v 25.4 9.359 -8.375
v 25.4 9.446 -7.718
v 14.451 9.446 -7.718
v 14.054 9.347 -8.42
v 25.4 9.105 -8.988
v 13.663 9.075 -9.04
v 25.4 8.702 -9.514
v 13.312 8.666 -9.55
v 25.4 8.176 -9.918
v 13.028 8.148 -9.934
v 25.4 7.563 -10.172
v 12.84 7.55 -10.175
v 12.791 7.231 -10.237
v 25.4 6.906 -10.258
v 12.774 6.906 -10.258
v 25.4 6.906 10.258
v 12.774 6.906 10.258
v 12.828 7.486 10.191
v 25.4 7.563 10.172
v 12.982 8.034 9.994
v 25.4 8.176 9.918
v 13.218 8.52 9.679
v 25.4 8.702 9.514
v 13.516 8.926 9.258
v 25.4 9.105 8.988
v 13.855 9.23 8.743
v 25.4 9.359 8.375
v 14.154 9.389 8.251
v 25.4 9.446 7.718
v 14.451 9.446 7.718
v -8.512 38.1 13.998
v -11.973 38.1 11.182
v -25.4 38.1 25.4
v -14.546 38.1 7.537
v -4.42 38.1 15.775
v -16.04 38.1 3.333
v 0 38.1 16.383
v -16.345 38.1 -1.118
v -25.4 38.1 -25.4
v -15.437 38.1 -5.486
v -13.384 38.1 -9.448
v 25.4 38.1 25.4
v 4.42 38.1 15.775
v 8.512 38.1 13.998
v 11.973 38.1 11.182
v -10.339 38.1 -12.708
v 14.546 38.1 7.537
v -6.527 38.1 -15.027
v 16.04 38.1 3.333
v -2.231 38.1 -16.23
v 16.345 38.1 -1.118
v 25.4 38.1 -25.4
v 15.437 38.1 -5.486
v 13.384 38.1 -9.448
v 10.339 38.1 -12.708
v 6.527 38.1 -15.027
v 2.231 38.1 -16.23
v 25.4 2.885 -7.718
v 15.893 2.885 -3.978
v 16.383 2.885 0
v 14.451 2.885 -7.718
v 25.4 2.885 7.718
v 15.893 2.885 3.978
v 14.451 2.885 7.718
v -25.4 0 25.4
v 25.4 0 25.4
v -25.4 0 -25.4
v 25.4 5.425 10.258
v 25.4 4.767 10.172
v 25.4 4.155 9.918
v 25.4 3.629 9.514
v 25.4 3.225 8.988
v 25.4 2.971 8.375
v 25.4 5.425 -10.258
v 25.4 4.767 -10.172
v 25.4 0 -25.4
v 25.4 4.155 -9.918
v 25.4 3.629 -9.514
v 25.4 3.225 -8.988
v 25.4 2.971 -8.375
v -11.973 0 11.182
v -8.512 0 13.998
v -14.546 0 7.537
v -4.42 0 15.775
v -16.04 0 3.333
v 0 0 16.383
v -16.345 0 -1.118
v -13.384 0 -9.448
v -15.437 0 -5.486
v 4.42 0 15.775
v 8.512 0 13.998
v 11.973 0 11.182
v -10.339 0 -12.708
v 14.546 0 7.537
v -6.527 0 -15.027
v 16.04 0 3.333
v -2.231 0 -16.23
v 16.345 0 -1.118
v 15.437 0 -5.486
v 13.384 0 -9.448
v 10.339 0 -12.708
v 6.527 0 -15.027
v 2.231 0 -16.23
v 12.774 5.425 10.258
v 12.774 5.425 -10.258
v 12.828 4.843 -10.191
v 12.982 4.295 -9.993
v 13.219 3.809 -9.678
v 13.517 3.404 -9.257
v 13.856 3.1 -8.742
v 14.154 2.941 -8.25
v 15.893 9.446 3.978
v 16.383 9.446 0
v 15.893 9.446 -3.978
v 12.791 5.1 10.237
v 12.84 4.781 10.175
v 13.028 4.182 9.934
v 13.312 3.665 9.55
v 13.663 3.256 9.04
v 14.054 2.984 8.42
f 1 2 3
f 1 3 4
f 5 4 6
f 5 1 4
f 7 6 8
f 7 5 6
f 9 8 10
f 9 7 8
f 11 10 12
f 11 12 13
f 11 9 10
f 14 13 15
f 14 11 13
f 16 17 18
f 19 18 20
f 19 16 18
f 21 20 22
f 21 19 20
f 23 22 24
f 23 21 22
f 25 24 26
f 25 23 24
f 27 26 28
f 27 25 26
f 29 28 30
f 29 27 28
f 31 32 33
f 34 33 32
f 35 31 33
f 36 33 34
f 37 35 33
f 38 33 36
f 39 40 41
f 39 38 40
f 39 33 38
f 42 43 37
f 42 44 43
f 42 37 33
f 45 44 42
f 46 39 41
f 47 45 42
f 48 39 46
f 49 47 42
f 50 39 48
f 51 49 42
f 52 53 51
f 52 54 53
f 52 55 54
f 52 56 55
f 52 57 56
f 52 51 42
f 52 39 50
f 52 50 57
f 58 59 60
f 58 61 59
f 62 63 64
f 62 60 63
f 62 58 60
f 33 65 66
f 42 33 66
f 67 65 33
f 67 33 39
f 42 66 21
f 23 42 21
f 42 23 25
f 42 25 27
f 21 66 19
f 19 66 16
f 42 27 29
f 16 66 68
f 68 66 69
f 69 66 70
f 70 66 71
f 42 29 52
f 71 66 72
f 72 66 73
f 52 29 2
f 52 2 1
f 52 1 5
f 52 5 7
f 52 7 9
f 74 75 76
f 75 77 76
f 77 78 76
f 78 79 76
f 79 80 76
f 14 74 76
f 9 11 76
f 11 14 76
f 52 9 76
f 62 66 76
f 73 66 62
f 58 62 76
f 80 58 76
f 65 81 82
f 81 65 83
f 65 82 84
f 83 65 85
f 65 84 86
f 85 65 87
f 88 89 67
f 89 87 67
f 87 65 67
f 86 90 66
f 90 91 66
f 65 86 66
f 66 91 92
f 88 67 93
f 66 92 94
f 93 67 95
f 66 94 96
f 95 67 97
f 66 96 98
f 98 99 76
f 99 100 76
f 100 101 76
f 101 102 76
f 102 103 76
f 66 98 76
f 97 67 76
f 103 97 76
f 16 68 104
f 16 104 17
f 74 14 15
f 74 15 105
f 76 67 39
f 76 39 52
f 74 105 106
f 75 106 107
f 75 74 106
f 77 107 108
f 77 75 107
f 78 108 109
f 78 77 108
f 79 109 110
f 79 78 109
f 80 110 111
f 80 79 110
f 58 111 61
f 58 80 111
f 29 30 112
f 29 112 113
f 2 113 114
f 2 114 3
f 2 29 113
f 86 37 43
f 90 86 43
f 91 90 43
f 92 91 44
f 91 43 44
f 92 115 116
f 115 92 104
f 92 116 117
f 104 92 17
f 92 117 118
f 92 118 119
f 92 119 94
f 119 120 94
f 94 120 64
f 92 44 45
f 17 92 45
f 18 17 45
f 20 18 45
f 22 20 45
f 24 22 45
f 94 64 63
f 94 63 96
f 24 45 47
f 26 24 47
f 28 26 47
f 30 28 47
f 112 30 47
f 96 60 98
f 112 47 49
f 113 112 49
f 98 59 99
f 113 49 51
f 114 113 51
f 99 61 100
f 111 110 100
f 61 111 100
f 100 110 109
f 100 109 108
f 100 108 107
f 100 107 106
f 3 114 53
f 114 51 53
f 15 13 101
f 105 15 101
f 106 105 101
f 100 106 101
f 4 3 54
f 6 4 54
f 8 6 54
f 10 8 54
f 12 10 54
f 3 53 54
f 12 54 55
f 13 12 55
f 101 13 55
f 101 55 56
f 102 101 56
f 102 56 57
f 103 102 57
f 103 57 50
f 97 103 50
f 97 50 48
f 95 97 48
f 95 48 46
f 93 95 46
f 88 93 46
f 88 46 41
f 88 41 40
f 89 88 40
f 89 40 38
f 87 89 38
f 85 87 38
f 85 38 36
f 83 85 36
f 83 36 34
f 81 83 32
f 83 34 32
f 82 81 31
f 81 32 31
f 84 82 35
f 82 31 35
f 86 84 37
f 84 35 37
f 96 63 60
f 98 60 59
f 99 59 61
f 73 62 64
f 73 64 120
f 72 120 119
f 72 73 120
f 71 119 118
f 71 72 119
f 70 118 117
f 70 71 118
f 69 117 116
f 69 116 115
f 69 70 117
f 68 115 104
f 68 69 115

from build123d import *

# Parameters (mm, degrees)
SKETCH1_W           = 50.8
SKETCH1_H           = 50.8
BOSS_EXTRUDE1_DEPTH = 38.1
SKETCH2_R           = 16.383
CUT_EXTRUDE1_DEPTH  = 49.53
CUT_EXTRUDE2_DEPTH  = 29.21


with BuildPart() as part:
    # Sketch1 → Boss-Extrude1 (new body)
    with BuildSketch(Plane(origin=(0, 0, 0), x_dir=(1, 0, 0), z_dir=(0, 1, 0))):
        Rectangle(SKETCH1_W, SKETCH1_H)
    extrude(amount=BOSS_EXTRUDE1_DEPTH)

    # Sketch2 → Cut-Extrude1 (cut)
    with BuildSketch(Plane(origin=(0, 38.1, 0), x_dir=(1, 0, 0), z_dir=(0, 1, 0))):
        with Locations(Location((0, 0, 0), (0, 0, 270))):
            Circle(SKETCH2_R)
    extrude(amount=-CUT_EXTRUDE1_DEPTH, mode=Mode.SUBTRACT)

    # Sketch3 → Cut-Extrude2 (cut)
    with BuildSketch(Plane(origin=(25.4, 0, 0), x_dir=(0, 0, -1), z_dir=(1, 0, 0))):
        with BuildLine():
            Line((-7.718095527, 9.445615075), (7.718095527, 9.445615075))
            ThreePointArc((7.718095527, 9.445615075), (9.514146751, 8.701666299), (10.258095527, 6.905615075))
            Line((10.258095527, 6.905615075), (10.258095527, 5.424599661))
            ThreePointArc((10.258095527, 5.424599661), (9.514146751, 3.628548437), (7.718095527, 2.884599661))
            Line((7.718095527, 2.884599661), (-7.718095527, 2.884599661))
            ThreePointArc((-7.718095527, 2.884599661), (-9.514146751, 3.628548437), (-10.258095527, 5.424599661))
            Line((-10.258095527, 5.424599661), (-10.258095527, 6.905615075))
            ThreePointArc((-10.258095527, 6.905615075), (-9.514146751, 8.701666299), (-7.718095527, 9.445615075))
        make_face()
    extrude(amount=-CUT_EXTRUDE2_DEPTH, mode=Mode.SUBTRACT)


solid = part.part
